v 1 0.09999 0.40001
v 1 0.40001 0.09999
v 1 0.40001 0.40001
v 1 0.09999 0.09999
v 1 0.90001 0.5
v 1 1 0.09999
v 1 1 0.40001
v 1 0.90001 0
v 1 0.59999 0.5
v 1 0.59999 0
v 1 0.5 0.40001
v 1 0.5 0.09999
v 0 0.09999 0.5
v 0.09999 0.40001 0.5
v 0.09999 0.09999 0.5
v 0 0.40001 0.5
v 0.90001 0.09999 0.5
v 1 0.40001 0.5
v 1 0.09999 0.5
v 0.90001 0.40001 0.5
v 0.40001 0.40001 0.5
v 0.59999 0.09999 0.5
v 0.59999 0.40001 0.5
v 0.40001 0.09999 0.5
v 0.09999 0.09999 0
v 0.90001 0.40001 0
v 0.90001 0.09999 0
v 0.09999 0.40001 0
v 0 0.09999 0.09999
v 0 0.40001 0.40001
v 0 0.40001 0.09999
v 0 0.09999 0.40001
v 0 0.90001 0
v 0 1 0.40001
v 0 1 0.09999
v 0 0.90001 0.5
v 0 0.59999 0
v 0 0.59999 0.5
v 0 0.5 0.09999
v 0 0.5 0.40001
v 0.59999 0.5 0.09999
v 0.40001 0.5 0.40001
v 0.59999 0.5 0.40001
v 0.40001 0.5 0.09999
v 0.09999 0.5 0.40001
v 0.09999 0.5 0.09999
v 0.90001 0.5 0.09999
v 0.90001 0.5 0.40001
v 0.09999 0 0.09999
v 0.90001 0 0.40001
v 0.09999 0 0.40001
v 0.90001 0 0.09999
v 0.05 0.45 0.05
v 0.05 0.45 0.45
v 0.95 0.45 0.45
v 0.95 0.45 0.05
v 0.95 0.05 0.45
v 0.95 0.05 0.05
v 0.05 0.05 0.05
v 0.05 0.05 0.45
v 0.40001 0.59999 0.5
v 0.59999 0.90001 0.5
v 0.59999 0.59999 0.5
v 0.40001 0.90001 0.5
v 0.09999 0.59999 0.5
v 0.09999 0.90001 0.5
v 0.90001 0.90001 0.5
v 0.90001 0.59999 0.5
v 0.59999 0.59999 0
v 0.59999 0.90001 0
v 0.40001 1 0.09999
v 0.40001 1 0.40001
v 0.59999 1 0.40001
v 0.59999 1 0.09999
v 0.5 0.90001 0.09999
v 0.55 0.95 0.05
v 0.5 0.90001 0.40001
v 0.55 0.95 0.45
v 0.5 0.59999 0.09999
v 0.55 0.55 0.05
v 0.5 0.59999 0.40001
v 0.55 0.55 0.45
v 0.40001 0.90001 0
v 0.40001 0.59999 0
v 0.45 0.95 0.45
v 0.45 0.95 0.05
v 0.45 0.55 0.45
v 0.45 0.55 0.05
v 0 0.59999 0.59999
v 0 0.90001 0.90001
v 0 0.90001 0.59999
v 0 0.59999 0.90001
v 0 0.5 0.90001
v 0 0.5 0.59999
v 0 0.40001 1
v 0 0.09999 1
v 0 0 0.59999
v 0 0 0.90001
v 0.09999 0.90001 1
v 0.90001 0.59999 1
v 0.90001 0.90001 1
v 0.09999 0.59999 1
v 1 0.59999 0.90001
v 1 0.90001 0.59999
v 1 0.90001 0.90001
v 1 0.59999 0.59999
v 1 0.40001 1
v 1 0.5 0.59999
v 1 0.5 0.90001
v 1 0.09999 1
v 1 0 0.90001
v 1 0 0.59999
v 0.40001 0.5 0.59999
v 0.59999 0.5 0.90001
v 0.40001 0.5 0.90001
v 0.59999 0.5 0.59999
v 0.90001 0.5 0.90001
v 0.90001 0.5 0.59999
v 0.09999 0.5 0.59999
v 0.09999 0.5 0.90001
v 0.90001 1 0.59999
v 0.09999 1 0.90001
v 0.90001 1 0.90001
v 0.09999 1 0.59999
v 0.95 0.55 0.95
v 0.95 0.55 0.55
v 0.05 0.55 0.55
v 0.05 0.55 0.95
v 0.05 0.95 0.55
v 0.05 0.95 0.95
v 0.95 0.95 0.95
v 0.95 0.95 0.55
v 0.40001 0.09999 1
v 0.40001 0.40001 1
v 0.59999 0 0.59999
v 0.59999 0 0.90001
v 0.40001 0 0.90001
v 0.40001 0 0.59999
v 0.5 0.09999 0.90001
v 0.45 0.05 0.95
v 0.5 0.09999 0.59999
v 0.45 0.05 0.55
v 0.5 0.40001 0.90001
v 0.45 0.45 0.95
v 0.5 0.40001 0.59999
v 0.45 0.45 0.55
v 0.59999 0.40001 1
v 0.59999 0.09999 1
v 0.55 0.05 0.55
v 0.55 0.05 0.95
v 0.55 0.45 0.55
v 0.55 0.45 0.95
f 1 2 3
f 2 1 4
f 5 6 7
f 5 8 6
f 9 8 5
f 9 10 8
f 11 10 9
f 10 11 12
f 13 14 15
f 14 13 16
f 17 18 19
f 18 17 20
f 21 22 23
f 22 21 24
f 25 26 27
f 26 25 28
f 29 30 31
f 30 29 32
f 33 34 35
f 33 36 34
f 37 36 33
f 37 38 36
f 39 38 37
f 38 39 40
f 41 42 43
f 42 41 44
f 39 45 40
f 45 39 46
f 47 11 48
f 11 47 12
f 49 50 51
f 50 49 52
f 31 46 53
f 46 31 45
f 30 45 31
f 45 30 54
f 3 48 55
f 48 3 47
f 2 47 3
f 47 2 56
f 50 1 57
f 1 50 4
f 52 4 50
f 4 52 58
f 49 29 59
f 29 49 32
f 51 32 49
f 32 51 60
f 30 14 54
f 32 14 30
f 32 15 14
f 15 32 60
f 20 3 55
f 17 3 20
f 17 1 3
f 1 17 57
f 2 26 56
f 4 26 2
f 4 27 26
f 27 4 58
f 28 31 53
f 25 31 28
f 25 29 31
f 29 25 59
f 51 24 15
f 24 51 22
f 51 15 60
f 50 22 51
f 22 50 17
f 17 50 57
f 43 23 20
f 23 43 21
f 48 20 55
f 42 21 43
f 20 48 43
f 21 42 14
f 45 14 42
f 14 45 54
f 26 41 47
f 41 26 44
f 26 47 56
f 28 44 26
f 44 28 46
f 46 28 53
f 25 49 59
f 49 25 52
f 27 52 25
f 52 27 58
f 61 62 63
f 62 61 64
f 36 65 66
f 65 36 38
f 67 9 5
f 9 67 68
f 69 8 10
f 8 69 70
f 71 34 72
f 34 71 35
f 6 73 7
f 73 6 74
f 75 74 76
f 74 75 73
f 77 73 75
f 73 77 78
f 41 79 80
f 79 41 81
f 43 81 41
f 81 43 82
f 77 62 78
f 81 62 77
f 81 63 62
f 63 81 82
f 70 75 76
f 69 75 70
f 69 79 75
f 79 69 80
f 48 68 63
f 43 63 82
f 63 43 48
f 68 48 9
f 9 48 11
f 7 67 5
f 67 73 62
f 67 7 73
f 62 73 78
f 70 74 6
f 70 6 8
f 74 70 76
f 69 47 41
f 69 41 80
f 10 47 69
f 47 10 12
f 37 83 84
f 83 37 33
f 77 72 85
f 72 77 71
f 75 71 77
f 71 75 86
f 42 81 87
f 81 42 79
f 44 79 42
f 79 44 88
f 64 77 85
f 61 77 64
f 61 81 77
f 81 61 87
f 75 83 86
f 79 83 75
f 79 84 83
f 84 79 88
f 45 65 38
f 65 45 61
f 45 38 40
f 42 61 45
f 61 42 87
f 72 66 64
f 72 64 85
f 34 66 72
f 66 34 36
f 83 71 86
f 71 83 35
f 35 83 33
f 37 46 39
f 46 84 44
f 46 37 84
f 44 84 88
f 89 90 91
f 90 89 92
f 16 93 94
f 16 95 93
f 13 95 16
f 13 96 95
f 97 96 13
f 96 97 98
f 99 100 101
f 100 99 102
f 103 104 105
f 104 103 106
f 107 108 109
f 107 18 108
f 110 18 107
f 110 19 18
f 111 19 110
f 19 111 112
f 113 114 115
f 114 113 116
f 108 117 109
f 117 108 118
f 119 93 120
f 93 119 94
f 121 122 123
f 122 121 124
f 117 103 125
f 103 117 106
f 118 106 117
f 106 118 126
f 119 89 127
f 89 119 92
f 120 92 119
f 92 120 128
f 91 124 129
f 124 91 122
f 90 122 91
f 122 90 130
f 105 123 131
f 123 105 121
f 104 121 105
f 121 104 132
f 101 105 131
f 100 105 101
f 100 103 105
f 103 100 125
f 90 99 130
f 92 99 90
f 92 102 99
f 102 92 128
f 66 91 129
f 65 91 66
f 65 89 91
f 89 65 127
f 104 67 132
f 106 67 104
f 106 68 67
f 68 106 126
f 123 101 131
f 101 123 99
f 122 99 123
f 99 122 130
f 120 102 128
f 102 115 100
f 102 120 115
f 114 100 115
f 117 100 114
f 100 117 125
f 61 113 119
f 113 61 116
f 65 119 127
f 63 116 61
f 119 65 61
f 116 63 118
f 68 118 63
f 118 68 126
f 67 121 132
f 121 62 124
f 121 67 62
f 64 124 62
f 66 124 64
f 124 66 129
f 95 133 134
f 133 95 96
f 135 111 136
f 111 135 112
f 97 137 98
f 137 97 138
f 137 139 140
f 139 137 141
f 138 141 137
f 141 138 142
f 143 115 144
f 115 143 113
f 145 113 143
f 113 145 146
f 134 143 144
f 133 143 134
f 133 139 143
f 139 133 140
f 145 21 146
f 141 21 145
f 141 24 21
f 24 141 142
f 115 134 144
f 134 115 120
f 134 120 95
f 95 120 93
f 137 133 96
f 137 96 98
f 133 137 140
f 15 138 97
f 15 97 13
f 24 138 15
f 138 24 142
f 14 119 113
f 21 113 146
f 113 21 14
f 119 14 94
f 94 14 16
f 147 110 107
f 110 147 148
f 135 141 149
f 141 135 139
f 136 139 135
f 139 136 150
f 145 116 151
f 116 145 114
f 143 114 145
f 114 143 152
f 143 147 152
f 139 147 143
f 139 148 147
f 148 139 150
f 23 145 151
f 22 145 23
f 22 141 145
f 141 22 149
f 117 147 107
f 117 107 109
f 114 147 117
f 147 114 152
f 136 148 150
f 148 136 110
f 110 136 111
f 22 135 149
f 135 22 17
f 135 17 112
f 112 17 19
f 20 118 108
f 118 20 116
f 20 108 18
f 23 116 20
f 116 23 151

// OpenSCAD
module theWall(){
  brick_color="gray";
  brick_d=[1,0.5,0.5];
  gap=0.1;
  
  module brick_old(){
    translate([brick_d.x/2,brick_d.y/2,brick_d.z/2]){
      render(convexity=10)
      intersection(){
        cube(brick_d,true);
        union(){
          cube([brick_d.x-gap/2,brick_d.y-gap/2,brick_d.z+gap],true);
          cube([brick_d.x+gap,brick_d.y-gap/2,brick_d.z-gap/2],true);
          cube([brick_d.x-gap/2,brick_d.y+gap,brick_d.z-gap/2],true);
        }
      }
    }
  }
  
  module brick(){
    module cutter(){
      linear_extrude(max(brick_d)*2,center=true)
      polygon([[-gap,gap],[gap,0],[0,-gap]]);
    }
    render()
    difference(){
      cube(brick_d,center=true);
      translate([-brick_d.x/2,brick_d.y/2,0]) cutter();
      translate([brick_d.x/2,brick_d.y/2,0]) rotate([0,0,-90]) cutter();
      translate([brick_d.x/2,-brick_d.y/2,0]) rotate([0,0,180]) cutter();
      translate([-brick_d.x/2,-brick_d.y/2,0]) rotate([0,0,90]) cutter();
      
      translate([-brick_d.x/2,0,brick_d.z/2]) rotate([90,0,0]) cutter();
      translate([brick_d.x/2,0,brick_d.z/2]) rotate([90,90,0]) cutter();
      translate([brick_d.x/2,0,-brick_d.z/2]) rotate([90,180,0]) cutter();
      translate([-brick_d.x/2,0,-brick_d.z/2]) rotate([90,-90,0]) cutter();
      
      translate([0,-brick_d.y/2,brick_d.z/2]) rotate([90,0,0]) rotate([0,90,0]) cutter();
      translate([0,brick_d.y/2,brick_d.z/2]) rotate([0,0,0]) rotate([0,90,0]) cutter();
      translate([0,brick_d.y/2,-brick_d.z/2]) rotate([-90,0,0]) rotate([0,90,0]) cutter();
      translate([0,-brick_d.y/2,-brick_d.z/2]) rotate([180,0,0]) rotate([0,90,0]) cutter();
    }
  }
  
  module brick_layer(){
    render(convexity=10)
    intersection(){
      union(){
        translate([0,-brick_d.y/2,0]) brick();
        translate([brick_d.x/2,brick_d.y/2,0]) brick();
        translate([-brick_d.x/2,brick_d.y/2,0]) brick();
      }
      cube([1,1,1],center=true);
    }
  }
  
  color(brick_color)
  render(convexity=10)
  translate([0.5,0.5,0.25]){
    brick_layer();
    translate([0,0,brick_d.z]) rotate([0,0,180]) brick_layer();
  }
}

theWall();
